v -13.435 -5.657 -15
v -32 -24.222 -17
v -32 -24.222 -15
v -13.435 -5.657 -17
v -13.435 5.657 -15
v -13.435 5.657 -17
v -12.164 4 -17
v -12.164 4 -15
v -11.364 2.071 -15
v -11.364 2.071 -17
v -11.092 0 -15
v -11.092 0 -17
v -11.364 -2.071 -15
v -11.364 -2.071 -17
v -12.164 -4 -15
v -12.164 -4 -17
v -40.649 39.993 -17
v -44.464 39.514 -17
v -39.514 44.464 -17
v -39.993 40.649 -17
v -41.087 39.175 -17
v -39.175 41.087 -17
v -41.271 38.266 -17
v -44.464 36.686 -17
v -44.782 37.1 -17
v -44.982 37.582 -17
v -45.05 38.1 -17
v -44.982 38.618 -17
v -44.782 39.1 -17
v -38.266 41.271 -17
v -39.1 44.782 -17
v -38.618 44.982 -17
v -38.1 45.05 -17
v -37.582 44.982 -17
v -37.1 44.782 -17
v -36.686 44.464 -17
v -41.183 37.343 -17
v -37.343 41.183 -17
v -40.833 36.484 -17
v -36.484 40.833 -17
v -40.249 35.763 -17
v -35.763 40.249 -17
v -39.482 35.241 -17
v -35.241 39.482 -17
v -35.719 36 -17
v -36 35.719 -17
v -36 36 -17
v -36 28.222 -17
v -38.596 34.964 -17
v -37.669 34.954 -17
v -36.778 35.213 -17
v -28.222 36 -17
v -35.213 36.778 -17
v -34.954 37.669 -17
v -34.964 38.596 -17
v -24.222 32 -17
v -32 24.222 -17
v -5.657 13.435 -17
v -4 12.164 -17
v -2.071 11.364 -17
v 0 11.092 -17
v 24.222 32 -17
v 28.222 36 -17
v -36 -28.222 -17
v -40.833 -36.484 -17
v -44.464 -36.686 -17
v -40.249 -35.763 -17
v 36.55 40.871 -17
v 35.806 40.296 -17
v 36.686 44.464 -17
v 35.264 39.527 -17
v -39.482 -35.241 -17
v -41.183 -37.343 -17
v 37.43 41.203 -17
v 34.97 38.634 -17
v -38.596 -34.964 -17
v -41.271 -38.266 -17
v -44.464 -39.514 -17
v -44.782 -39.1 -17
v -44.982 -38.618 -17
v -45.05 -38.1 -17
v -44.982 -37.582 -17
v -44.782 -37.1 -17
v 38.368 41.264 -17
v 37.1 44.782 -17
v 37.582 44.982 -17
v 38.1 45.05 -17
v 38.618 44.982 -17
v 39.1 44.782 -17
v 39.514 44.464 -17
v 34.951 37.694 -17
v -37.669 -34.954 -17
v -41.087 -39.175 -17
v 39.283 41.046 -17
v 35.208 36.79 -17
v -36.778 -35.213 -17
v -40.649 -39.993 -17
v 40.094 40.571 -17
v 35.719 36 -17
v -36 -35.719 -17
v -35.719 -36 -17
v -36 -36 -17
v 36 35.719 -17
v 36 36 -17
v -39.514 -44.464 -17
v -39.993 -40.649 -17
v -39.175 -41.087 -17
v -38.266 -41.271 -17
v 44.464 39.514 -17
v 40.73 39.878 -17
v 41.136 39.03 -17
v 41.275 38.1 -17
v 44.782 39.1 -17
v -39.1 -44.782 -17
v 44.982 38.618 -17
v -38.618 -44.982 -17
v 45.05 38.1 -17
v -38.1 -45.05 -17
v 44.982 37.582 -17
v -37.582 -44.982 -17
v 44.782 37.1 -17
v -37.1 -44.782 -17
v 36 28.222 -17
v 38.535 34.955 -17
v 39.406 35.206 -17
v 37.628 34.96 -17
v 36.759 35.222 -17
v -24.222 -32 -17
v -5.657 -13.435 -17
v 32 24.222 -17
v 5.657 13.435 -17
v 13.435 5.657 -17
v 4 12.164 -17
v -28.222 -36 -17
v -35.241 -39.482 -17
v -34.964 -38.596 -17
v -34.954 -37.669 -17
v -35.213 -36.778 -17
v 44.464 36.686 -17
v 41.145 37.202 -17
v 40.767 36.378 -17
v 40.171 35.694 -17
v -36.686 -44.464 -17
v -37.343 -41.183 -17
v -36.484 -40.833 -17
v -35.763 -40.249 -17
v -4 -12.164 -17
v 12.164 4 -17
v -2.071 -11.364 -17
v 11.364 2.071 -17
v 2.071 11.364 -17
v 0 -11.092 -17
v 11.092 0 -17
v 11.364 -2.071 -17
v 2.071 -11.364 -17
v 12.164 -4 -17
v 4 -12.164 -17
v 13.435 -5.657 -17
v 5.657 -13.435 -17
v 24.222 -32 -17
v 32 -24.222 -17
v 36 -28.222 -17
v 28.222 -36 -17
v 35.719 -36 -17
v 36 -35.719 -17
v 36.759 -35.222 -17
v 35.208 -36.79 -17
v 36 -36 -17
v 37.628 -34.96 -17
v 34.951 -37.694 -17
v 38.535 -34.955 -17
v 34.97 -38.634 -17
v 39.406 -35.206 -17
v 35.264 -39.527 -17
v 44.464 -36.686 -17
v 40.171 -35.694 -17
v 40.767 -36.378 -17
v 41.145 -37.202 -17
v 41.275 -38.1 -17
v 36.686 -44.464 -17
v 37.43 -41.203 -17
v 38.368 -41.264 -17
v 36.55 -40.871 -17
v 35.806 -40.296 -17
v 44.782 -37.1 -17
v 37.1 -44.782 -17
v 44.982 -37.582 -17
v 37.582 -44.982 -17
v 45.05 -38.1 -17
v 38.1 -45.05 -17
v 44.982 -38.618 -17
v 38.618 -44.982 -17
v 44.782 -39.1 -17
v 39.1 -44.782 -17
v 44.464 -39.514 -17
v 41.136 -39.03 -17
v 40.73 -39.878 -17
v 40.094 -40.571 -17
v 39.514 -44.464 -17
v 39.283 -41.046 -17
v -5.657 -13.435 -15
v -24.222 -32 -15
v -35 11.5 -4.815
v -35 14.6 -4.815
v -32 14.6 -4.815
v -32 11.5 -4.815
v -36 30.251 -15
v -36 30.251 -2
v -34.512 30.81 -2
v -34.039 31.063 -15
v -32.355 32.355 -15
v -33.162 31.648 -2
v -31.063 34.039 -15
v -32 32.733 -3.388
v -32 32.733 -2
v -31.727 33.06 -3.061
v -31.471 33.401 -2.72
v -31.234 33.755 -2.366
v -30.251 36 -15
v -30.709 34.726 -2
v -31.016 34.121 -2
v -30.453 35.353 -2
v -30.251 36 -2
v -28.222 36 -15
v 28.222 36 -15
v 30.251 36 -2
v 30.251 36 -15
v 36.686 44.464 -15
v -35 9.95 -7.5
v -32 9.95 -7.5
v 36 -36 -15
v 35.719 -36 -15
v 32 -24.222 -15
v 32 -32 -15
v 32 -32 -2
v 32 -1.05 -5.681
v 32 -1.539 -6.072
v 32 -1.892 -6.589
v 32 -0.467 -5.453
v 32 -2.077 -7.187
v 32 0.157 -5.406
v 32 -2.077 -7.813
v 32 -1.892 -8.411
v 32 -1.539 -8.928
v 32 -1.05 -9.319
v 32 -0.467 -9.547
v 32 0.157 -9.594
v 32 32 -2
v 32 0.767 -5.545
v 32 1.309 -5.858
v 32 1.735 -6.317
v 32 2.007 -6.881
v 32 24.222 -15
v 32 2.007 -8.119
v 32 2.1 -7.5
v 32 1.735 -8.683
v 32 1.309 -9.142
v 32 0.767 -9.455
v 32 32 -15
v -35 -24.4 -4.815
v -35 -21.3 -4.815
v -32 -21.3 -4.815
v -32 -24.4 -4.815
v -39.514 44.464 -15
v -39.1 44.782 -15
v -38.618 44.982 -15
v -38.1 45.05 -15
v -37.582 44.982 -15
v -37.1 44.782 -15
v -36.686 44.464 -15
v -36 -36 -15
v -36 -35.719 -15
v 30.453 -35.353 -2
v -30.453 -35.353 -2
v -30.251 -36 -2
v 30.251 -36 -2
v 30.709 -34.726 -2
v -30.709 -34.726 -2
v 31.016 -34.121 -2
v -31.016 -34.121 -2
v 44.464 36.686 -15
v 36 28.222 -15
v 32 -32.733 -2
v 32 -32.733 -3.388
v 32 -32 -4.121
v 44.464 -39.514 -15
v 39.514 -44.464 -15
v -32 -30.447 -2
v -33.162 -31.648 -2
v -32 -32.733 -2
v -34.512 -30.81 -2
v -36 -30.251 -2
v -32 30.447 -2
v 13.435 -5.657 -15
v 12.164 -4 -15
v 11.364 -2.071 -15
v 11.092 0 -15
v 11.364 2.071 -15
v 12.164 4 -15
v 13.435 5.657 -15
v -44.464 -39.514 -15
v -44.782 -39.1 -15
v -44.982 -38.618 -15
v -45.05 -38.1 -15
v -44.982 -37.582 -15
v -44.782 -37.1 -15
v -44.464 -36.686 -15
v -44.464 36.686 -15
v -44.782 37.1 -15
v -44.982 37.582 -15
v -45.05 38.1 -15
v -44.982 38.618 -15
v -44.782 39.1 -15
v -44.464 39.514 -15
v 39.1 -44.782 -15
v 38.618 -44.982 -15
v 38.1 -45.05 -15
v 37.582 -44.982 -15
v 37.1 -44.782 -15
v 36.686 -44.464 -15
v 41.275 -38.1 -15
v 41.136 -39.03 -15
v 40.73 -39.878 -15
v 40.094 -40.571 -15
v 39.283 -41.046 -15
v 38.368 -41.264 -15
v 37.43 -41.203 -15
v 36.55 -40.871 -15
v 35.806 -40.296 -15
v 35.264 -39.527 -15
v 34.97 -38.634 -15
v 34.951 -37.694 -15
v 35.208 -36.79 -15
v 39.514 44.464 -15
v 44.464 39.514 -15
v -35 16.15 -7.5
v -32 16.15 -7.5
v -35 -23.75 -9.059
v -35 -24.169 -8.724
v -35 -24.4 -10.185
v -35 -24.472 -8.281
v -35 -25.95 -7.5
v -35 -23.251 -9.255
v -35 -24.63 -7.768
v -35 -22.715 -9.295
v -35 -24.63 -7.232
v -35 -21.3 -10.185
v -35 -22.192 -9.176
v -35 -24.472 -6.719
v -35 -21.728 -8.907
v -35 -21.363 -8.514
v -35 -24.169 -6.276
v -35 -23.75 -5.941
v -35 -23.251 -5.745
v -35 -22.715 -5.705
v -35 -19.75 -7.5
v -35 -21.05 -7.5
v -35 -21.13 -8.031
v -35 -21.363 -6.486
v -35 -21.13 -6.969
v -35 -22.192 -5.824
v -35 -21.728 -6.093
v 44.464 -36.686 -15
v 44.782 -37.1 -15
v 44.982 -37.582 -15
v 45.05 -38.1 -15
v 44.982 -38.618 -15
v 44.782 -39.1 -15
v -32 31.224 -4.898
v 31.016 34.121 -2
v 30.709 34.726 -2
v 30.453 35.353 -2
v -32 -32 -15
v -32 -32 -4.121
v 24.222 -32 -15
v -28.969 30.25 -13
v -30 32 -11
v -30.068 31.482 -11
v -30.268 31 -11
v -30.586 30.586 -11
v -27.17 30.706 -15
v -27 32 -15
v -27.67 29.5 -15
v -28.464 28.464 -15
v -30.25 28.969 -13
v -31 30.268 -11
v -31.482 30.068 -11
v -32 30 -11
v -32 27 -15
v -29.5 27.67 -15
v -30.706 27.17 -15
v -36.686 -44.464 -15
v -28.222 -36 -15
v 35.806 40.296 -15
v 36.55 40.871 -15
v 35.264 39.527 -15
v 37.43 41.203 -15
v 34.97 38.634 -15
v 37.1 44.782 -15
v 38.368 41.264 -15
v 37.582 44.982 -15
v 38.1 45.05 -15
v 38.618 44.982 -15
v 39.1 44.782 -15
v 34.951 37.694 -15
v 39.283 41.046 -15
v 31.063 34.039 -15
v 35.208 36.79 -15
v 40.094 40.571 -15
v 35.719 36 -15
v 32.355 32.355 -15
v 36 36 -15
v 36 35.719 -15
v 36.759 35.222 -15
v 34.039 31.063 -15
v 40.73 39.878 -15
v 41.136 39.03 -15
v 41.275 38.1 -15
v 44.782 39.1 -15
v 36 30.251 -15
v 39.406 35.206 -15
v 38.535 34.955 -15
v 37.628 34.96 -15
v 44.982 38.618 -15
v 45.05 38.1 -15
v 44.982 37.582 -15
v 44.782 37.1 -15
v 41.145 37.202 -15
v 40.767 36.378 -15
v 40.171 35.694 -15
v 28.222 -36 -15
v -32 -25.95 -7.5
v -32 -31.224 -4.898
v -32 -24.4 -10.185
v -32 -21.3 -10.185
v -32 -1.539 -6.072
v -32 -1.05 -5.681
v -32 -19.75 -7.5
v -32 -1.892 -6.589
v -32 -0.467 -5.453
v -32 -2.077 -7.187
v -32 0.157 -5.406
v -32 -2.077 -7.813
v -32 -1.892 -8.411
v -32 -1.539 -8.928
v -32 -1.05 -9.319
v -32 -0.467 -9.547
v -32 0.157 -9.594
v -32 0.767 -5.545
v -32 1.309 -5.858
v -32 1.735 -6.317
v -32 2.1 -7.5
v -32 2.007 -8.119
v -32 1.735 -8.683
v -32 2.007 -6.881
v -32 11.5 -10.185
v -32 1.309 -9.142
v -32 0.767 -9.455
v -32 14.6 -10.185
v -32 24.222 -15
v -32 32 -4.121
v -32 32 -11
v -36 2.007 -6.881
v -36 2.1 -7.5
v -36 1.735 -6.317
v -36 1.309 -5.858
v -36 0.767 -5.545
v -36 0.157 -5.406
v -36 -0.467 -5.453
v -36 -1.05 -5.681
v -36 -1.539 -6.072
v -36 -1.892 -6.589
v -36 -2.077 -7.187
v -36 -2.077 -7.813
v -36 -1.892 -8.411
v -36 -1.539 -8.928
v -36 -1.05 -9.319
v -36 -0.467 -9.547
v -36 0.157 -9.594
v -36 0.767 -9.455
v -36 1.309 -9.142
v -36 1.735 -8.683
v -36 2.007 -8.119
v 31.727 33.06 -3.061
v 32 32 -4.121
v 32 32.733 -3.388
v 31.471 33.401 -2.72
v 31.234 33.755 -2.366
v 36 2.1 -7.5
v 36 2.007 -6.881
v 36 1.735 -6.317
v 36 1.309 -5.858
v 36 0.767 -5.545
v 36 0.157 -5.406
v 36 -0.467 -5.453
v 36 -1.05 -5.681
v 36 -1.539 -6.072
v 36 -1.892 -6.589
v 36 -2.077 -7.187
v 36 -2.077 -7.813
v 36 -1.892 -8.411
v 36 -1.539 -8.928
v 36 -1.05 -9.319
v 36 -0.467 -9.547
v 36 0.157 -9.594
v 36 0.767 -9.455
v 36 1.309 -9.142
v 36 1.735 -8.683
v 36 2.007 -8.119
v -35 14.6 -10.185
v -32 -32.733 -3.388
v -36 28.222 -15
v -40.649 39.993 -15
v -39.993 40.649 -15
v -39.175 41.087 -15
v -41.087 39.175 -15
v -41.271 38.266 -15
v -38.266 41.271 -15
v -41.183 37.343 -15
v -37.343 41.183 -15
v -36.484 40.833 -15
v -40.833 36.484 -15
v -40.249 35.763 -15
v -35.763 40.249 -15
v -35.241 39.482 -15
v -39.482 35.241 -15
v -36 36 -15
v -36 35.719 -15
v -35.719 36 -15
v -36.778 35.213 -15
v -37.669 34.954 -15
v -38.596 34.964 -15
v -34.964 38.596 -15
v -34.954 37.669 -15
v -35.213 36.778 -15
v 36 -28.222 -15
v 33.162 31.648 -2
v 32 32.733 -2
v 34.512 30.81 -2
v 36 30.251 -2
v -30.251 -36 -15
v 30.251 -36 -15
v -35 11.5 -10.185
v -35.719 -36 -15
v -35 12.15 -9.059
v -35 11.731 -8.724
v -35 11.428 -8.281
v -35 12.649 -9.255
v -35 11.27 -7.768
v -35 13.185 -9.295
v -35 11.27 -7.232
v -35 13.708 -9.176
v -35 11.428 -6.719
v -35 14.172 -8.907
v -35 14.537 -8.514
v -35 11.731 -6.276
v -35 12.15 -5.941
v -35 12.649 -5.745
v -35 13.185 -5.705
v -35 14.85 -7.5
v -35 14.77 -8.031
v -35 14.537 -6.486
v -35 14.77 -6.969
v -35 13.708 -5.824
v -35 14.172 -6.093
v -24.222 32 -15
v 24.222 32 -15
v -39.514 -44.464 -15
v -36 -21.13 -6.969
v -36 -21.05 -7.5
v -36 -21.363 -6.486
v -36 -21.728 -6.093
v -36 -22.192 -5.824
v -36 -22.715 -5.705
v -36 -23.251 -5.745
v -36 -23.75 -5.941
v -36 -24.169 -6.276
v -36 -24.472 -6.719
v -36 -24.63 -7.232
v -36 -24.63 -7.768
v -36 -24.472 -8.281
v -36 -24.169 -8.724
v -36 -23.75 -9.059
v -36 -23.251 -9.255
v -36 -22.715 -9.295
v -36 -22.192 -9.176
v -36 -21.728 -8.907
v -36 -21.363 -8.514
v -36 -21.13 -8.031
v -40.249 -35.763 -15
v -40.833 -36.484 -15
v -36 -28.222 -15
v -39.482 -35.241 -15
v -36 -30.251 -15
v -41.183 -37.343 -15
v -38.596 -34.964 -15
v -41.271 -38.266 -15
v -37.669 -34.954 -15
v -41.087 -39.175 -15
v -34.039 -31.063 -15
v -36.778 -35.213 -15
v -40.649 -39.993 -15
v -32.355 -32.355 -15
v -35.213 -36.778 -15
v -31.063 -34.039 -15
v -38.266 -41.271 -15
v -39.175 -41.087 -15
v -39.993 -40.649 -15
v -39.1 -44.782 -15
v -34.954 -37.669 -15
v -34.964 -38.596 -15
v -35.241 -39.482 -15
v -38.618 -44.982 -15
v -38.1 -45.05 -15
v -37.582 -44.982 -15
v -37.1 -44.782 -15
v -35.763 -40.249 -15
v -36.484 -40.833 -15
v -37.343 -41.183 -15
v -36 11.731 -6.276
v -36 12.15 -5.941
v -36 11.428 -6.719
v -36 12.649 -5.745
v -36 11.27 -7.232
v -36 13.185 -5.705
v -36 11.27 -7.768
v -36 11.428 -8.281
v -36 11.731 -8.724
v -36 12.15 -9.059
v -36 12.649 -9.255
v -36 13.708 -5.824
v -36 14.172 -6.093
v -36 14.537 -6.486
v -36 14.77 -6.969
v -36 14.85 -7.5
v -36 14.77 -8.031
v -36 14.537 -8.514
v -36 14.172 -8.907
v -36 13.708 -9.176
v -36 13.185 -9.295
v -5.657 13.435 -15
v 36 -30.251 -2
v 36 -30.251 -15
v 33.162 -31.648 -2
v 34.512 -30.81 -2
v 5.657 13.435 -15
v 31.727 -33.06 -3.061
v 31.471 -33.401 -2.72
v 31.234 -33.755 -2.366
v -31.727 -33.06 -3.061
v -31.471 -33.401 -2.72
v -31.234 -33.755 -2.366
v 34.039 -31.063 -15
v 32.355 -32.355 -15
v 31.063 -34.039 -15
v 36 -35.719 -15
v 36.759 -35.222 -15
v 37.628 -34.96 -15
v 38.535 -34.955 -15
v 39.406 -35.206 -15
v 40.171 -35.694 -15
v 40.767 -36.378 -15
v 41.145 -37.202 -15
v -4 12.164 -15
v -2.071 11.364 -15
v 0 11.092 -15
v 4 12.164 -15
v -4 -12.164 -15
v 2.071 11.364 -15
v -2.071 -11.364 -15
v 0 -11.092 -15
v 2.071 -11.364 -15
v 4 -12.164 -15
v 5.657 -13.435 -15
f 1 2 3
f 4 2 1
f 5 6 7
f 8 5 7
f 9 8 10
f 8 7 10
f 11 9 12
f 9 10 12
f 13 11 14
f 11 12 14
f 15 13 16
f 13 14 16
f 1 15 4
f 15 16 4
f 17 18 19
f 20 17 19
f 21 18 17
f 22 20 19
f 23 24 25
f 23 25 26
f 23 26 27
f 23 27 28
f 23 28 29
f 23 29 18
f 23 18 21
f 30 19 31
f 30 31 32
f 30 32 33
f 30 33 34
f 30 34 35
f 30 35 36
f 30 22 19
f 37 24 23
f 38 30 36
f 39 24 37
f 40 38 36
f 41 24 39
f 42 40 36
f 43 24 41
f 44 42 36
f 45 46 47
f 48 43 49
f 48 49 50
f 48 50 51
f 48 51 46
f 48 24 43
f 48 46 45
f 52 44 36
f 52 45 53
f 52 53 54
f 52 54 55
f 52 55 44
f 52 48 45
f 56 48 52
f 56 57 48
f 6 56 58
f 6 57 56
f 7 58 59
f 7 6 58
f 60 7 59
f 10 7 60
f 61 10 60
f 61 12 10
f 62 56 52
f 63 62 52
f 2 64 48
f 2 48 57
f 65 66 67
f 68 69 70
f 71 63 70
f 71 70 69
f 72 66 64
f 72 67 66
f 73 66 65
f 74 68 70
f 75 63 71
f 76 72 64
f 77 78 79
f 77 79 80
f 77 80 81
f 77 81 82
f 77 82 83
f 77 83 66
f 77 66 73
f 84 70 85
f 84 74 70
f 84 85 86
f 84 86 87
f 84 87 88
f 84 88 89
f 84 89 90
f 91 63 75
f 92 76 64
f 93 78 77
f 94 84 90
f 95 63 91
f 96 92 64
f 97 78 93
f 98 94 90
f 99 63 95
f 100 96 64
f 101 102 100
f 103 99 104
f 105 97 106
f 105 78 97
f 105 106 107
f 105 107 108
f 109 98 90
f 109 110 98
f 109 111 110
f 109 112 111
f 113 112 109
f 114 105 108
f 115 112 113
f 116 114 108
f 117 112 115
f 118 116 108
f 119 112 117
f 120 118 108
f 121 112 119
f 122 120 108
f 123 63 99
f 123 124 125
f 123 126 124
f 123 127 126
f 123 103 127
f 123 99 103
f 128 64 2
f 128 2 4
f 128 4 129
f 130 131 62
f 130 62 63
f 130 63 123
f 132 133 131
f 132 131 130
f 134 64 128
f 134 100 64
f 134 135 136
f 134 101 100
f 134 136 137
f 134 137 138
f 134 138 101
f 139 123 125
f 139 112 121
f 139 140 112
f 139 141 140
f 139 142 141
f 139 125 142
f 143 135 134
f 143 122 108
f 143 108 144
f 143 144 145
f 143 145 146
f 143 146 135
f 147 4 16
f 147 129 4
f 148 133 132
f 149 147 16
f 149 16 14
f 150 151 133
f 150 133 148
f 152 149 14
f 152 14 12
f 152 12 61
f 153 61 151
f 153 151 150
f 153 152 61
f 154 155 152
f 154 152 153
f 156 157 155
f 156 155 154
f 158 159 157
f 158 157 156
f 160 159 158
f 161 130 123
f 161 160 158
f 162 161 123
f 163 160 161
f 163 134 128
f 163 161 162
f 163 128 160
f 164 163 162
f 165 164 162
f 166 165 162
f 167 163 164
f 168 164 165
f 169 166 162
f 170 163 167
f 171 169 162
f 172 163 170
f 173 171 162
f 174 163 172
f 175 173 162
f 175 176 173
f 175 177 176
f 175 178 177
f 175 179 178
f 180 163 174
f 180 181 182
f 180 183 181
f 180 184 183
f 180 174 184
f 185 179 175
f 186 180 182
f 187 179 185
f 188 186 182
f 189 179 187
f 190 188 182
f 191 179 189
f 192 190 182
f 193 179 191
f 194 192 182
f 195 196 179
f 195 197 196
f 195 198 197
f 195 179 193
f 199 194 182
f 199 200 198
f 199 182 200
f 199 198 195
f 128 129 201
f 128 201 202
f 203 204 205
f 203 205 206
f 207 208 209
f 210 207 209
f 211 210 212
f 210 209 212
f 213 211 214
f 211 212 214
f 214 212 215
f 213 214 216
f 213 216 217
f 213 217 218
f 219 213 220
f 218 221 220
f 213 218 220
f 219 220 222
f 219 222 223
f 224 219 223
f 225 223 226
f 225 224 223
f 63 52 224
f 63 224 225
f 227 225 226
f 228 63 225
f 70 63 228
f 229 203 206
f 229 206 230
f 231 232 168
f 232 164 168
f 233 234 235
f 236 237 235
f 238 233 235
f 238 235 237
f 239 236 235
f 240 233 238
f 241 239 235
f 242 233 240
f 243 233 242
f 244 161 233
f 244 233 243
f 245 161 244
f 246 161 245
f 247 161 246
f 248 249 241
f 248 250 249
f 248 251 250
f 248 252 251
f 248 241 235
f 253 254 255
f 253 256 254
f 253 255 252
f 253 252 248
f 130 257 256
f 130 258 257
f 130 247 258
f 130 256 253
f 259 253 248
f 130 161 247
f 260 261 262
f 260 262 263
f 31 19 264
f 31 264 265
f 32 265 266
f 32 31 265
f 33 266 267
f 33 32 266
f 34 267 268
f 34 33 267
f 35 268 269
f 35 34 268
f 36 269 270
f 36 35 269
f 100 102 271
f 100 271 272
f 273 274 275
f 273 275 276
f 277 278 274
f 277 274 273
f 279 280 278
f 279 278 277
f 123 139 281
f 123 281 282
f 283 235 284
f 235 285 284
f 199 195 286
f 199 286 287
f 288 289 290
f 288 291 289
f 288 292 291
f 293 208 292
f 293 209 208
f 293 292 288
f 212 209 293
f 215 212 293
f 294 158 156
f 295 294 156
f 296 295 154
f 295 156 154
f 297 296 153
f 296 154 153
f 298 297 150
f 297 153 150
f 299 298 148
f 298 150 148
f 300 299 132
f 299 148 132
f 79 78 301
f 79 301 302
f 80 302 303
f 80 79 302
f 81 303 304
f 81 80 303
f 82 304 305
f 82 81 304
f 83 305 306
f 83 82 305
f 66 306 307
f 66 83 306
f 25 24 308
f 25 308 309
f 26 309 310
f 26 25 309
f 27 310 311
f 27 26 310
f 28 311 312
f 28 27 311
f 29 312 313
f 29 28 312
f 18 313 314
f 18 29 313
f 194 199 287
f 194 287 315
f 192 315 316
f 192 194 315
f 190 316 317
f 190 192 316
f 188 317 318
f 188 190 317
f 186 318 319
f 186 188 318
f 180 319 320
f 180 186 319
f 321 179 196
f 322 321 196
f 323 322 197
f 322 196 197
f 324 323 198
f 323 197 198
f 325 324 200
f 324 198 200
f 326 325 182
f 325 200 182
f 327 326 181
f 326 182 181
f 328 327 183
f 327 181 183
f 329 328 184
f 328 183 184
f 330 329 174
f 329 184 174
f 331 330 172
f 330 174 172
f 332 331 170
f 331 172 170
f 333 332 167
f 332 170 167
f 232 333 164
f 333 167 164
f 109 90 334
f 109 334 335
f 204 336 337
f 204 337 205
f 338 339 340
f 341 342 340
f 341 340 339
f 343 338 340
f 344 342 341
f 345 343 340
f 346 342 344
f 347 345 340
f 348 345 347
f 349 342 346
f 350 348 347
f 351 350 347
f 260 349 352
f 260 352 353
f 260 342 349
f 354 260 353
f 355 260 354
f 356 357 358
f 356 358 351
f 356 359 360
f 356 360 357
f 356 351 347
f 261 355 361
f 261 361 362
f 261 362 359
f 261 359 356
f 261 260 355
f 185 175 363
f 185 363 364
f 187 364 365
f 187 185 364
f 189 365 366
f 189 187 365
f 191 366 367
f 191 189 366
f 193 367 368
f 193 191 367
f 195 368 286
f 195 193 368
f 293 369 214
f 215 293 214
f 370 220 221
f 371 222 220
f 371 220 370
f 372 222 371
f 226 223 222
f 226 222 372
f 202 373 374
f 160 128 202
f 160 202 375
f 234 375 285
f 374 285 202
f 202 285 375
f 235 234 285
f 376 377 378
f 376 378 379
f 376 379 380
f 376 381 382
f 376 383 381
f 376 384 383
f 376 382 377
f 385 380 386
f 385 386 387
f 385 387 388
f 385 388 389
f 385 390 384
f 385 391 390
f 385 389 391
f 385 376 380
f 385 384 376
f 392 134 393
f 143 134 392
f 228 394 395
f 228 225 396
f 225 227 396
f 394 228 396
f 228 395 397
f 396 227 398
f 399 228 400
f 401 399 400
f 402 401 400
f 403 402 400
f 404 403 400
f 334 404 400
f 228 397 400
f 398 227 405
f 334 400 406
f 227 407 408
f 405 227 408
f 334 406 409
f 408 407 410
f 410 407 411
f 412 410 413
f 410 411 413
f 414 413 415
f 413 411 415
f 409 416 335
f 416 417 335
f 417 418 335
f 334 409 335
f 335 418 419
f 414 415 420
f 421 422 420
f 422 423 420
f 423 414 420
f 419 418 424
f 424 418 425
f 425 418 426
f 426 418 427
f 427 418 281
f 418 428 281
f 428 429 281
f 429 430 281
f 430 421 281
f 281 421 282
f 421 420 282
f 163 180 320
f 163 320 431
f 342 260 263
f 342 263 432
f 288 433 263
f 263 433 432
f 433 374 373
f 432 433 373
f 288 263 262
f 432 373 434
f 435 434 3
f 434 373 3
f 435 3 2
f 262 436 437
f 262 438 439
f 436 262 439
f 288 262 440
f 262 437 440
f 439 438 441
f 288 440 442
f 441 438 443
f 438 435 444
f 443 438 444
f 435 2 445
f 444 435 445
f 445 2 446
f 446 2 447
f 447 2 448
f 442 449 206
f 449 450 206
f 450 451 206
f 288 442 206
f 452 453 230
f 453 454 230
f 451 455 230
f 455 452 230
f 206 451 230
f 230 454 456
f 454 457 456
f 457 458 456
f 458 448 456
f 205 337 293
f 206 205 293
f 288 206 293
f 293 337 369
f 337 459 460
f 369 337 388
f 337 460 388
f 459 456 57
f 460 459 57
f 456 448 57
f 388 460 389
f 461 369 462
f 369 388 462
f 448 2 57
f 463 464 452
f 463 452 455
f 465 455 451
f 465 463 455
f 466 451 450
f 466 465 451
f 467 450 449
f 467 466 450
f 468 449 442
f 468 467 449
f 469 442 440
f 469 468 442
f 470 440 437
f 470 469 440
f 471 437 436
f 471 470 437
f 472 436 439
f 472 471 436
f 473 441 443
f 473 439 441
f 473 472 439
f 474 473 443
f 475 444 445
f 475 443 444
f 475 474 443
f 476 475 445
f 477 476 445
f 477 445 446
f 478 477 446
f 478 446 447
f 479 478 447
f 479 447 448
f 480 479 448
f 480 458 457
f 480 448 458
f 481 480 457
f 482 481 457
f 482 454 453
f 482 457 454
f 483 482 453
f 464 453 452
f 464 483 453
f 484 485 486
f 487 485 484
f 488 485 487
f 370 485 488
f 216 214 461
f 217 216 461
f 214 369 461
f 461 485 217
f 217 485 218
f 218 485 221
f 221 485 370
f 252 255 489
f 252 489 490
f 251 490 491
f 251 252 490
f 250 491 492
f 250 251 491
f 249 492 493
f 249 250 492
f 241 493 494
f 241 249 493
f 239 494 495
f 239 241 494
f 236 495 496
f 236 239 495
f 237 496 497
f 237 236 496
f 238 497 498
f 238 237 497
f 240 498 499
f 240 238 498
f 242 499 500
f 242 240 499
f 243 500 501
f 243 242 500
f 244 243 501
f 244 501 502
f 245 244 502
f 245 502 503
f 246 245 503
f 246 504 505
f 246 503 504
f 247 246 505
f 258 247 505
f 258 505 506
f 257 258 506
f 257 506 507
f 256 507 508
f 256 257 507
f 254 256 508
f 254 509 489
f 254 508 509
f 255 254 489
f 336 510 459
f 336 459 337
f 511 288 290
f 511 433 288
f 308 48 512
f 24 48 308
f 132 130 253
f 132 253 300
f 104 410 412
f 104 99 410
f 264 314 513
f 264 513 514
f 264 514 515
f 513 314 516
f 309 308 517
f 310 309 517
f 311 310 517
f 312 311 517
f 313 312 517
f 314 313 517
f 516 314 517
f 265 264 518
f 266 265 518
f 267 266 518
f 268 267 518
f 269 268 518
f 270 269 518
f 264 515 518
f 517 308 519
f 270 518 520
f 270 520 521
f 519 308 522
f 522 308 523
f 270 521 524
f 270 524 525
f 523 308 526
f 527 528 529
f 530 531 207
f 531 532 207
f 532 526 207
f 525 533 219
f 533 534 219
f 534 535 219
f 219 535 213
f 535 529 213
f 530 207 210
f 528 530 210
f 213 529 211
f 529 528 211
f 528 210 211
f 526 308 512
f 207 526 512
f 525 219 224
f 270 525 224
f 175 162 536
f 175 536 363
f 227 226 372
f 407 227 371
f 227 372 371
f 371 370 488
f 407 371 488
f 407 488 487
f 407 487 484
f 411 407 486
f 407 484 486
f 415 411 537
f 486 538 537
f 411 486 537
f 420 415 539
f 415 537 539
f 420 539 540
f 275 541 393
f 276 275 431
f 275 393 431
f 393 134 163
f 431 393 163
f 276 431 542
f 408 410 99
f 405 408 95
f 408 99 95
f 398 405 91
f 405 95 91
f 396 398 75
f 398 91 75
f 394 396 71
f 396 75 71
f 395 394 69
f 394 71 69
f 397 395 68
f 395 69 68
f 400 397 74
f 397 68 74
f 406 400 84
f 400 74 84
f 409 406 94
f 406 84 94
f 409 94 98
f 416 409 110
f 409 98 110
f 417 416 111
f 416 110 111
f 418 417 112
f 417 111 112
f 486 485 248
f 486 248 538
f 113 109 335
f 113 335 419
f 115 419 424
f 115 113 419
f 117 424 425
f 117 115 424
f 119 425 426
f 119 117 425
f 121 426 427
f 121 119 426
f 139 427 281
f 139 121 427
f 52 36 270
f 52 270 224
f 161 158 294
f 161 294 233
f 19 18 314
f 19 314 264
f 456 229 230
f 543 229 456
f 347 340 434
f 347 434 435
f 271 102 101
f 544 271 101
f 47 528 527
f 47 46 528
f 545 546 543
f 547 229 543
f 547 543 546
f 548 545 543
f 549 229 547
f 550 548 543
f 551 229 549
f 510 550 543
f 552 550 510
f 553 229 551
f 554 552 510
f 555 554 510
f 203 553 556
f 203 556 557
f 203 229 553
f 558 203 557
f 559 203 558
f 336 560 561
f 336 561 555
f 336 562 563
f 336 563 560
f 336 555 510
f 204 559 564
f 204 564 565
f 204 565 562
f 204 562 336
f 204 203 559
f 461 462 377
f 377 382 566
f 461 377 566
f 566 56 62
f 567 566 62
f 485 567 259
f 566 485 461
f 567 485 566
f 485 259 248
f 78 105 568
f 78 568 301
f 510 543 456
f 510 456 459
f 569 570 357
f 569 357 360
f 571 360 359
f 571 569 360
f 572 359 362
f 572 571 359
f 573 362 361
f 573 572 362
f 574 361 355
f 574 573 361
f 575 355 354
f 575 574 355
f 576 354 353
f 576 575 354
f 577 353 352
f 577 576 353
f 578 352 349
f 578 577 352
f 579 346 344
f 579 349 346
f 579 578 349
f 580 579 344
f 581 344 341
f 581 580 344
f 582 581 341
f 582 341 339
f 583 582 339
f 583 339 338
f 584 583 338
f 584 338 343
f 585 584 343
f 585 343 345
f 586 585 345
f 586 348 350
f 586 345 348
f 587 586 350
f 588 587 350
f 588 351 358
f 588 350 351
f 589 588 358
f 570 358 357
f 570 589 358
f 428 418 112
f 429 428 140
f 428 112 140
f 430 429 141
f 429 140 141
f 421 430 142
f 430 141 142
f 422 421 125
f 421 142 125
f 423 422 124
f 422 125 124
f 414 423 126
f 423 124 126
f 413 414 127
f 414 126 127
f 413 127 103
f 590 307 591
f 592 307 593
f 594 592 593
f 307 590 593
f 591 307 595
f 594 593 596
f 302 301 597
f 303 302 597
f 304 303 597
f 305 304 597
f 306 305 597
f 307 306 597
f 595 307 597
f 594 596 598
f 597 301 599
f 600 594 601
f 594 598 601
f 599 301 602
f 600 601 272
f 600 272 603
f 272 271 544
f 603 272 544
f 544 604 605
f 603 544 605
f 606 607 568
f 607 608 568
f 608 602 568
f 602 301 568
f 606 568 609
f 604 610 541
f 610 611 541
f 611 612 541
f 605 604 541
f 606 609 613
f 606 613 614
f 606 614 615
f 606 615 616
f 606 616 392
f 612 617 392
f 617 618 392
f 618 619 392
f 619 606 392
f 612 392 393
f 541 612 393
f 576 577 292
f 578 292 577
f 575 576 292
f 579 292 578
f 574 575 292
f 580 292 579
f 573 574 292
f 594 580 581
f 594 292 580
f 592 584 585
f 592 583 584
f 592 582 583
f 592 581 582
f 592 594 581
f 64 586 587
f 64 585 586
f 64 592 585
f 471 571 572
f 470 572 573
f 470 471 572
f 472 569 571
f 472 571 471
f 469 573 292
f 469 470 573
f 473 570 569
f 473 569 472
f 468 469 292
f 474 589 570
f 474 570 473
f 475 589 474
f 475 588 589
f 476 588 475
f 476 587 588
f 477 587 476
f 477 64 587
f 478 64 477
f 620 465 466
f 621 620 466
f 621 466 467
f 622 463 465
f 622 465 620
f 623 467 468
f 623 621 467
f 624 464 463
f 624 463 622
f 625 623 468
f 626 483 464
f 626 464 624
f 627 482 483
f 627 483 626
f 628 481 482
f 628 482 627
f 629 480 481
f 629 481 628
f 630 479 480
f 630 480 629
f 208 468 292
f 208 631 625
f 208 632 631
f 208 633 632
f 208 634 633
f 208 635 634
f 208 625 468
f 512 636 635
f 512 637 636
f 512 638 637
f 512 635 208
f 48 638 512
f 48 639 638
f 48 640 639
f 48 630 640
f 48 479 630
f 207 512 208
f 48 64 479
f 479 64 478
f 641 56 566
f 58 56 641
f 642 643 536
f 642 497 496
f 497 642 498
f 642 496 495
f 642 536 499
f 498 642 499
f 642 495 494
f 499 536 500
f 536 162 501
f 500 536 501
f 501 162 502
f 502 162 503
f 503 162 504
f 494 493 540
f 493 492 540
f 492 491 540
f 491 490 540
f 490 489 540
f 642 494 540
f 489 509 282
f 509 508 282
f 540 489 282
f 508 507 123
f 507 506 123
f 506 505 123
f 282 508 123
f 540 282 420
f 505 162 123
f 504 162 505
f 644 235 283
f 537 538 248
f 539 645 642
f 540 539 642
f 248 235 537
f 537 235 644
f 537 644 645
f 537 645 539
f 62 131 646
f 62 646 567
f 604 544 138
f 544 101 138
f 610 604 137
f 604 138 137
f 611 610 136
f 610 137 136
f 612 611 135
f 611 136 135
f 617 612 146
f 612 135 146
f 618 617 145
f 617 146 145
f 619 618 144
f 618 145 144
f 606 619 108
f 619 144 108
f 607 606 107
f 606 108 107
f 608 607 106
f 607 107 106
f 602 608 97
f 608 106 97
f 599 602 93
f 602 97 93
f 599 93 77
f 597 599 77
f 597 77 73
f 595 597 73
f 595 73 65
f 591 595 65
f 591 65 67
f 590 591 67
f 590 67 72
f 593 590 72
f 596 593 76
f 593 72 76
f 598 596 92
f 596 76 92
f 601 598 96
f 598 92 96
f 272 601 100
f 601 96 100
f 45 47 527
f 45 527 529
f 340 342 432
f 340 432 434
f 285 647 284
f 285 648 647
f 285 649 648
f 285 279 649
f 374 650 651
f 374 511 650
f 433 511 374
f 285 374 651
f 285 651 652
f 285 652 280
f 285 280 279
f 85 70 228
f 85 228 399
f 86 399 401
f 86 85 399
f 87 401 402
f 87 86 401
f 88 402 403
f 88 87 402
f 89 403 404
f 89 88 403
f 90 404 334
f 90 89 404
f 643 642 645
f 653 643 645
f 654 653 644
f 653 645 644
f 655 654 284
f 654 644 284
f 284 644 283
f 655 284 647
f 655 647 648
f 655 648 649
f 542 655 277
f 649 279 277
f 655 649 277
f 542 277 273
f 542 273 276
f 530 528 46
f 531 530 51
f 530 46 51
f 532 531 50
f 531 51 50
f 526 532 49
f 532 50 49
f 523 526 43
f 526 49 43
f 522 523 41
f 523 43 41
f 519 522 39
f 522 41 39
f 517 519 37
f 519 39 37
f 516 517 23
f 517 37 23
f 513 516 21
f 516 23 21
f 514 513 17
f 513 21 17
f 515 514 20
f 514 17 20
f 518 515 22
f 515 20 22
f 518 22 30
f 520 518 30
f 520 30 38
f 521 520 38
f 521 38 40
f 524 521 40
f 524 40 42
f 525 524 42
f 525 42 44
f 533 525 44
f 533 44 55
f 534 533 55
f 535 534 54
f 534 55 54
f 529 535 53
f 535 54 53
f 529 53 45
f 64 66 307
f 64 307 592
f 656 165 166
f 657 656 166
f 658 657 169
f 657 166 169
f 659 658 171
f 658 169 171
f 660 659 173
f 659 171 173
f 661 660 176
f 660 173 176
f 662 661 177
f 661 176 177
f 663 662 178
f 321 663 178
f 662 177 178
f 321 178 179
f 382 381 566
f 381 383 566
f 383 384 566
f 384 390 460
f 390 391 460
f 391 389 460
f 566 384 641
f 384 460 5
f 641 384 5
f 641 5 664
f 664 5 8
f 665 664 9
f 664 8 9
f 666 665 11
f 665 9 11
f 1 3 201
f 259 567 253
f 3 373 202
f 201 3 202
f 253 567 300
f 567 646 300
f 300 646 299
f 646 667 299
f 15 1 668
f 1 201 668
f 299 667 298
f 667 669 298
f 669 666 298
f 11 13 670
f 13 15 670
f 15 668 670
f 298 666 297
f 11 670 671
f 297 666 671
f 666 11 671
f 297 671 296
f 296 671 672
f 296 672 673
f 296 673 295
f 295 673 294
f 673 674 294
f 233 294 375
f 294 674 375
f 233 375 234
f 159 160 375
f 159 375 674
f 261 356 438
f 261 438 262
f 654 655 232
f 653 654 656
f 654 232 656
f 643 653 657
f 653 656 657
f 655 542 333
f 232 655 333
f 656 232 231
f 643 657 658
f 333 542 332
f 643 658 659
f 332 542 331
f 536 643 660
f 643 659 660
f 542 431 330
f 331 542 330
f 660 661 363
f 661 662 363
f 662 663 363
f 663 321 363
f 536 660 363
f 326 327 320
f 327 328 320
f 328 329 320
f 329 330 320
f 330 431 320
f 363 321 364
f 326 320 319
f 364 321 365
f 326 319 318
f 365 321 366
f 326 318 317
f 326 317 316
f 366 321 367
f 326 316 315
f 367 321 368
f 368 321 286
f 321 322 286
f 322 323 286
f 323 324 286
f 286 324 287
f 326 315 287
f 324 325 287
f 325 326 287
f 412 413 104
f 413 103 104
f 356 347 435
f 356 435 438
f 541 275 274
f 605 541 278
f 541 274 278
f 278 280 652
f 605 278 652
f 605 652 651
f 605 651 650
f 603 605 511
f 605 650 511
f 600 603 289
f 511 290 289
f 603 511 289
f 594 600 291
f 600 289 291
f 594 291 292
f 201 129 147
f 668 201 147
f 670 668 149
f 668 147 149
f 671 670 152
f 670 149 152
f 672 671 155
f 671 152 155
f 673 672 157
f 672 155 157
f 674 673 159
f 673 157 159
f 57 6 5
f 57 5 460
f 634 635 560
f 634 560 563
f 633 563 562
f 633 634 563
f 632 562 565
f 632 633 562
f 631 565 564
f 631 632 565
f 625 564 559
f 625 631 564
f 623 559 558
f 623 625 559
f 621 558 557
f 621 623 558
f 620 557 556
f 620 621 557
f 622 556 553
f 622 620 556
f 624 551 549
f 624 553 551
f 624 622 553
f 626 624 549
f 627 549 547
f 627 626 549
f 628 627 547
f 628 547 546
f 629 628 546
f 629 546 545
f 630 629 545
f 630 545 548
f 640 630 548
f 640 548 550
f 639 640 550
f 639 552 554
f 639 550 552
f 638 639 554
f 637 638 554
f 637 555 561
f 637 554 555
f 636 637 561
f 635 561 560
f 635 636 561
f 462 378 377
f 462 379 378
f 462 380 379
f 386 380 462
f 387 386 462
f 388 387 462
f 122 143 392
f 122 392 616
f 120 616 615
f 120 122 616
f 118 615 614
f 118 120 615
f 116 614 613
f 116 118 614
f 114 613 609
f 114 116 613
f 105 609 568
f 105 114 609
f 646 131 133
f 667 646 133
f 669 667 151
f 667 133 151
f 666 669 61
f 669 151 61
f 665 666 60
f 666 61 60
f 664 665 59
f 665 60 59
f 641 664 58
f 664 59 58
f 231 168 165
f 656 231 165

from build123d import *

# Parameters (mm, degrees)
CYLINDER_R               = 2.1
CYLINDER_DEPTH           = 73
PRISM_DEPTH              = 64
PRISM_ROLL_ANGLE         = 90
PRISM_PITCH_ANGLE        = -14.999988
PRISM_PLACEMENT_ANGLE    = 90
PRISM001_DEPTH           = 64
PRISM001_ROLL_ANGLE      = -90
PRISM001_PITCH_ANGLE     = -14.999988
PRISM001_PLACEMENT_ANGLE = -90
PRISM002_DEPTH           = 3
PRISM003_DEPTH           = 3
CYLINDER001_R            = 1.8
CYLINDER001_DEPTH        = 6
CYLINDER002_R            = 1.8
CYLINDER002_DEPTH        = 6
CUBE001_W                = 64
CUBE001_H                = 64
CUBE001_DEPTH            = 15
CUBE_W                   = 72
CUBE_H                   = 72
CUBE_DEPTH               = 15
SKETCH001_R              = 3.175
PAD_DEPTH                = 2
SKETCH_R                 = 8.125
POCKET_DEPTH             = 13
REVOLUTION_ANGLE         = -90


with BuildPart() as cylinder:
    # cylinder → cylinder (new body)
    with BuildSketch(Plane(origin=(-36.5, 0, -7.5), x_dir=(0, 1, 0), z_dir=(1, 0, 0))):
        Circle(CYLINDER_R)
    extrude(amount=CYLINDER_DEPTH)


with BuildPart() as prism:
    # prism → prism (new body)
    with BuildSketch(Plane.XY):
        Polygon((3, 0), (-1.5, 2.598076), (-1.5, -2.598076), align=None)
    extrude(amount=PRISM_DEPTH)


with BuildPart() as prism_1:
    # prism roll: moved
    add(prism.part.rotate(Axis((0, 0, 0), (1, 0, 0)), PRISM_ROLL_ANGLE))


with BuildPart() as prism_2:
    # prism pitch: moved
    add(prism_1.part.rotate(Axis((0, 0, 0), (0, 1, 0)), PRISM_PITCH_ANGLE))


with BuildPart() as prism_3:
    # prism placement: moved
    add(prism_2.part.moved(Location((-32.000004, 32, -2))).rotate(Axis((-32.000004, 32, -2), (0, 0, 1)), PRISM_PLACEMENT_ANGLE))


with BuildPart() as prism001:
    # prism001 → prism001 (new body)
    with BuildSketch(Plane.XY):
        Polygon((3, 0), (-1.5, 2.598076), (-1.5, -2.598076), align=None)
    extrude(amount=PRISM001_DEPTH)


with BuildPart() as prism001_1:
    # prism001 roll: moved
    add(prism001.part.rotate(Axis((0, 0, 0), (1, 0, 0)), PRISM001_ROLL_ANGLE))


with BuildPart() as prism001_2:
    # prism001 pitch: moved
    add(prism001_1.part.rotate(Axis((0, 0, 0), (0, 1, 0)), PRISM001_PITCH_ANGLE))


with BuildPart() as prism001_3:
    # prism001 placement: moved
    add(prism001_2.part.moved(Location((-32.000004, -32, -2))).rotate(Axis((-32.000004, -32, -2), (0, 0, 1)), PRISM001_PLACEMENT_ANGLE))


with BuildPart() as prism002:
    # prism002 → prism002 (new body)
    with BuildSketch(Plane(origin=(-35, 13.05, -7.5), x_dir=(0, 1, 0), z_dir=(1, 0, 0))):
        Polygon((3.1, 0), (1.55, 2.684679), (-1.55, 2.684679), (-3.1, 0), (-1.55, -2.684679), (1.55, -2.684679), align=None)
    extrude(amount=PRISM002_DEPTH)


with BuildPart() as prism003:
    # prism003 → prism003 (new body)
    with BuildSketch(Plane(origin=(-35, -22.85, -7.5), x_dir=(0, 1, 0), z_dir=(1, 0, 0))):
        Polygon((3.1, 0), (1.55, 2.684679), (-1.55, 2.684679), (-3.1, 0), (-1.55, -2.684679), (1.55, -2.684679), align=None)
    extrude(amount=PRISM003_DEPTH)


with BuildPart() as cylinder001:
    # cylinder001 → cylinder001 (new body)
    with BuildSketch(Plane(origin=(-36.5, 13.05, -7.5), x_dir=(0, 1, 0), z_dir=(1, 0, 0))):
        Circle(CYLINDER001_R)
    extrude(amount=CYLINDER001_DEPTH)


with BuildPart() as cylinder002:
    # cylinder002 → cylinder002 (new body)
    with BuildSketch(Plane(origin=(-36.5, -22.85, -7.5), x_dir=(0, 1, 0), z_dir=(1, 0, 0))):
        Circle(CYLINDER002_R)
    extrude(amount=CYLINDER002_DEPTH)


with BuildPart() as group:
    # cube001 → cube001 (new body)
    with BuildSketch(Plane(origin=(-32, -32, -17), x_dir=(1, 0, 0), z_dir=(0, 0, 1))):
        with Locations((32, 32)):
            Rectangle(CUBE001_W, CUBE001_H)
    extrude(amount=CUBE001_DEPTH)

    # Group: union cylinder, prism, prism001, prism002, prism003, cylinder001, cylinder002
    add(cylinder.part)
    add(prism_3.part)
    add(prism001_3.part)
    add(prism002.part)
    add(prism003.part)
    add(cylinder001.part)
    add(cylinder002.part)


with BuildPart() as base_square:
    # cube → cube (new body)
    with BuildSketch(Plane(origin=(-36, -36, -17), x_dir=(1, 0, 0), z_dir=(0, 0, 1))):
        with Locations((36, 36)):
            Rectangle(CUBE_W, CUBE_H)
    extrude(amount=CUBE_DEPTH)

    # difference: cut Group
    add(group.part, mode=Mode.SUBTRACT)

    # Sketch001 → Pad (new body)
    with BuildSketch(Plane(origin=(0, 0, -17), x_dir=(1, 0, 0), z_dir=(0, 0, -1))):
        with BuildLine():
            Line((-44.463961, 36.685786), (-13.435029, 5.656854))
            ThreePointArc((-13.435029, -5.656854), (-11.091883, 0), (-13.435029, 5.656854))
            Line((-13.435029, -5.656854), (-44.463961, -36.685786))
            ThreePointArc((-44.463961, -36.685786), (-45.049747, -38.1), (-44.463961, -39.514214))
            Line((-44.463961, -39.514214), (-39.514214, -44.463961))
            ThreePointArc((-39.514214, -44.463961), (-38.1, -45.049747), (-36.685786, -44.463961))
            Line((-36.685786, -44.463961), (-5.656854, -13.435029))
            ThreePointArc((5.656854, -13.435029), (0, -11.091883), (-5.656854, -13.435029))
            Line((5.656854, -13.435029), (36.685786, -44.463961))
            ThreePointArc((36.685786, -44.463961), (38.1, -45.049747), (39.514214, -44.463961))
            Line((39.514214, -44.463961), (44.463961, -39.514214))
            ThreePointArc((44.463961, -39.514214), (45.049747, -38.1), (44.463961, -36.685786))
            Line((44.463961, -36.685786), (13.435029, -5.656854))
            ThreePointArc((13.435029, 5.656854), (11.091883, 0), (13.435029, -5.656854))
            Line((13.435029, 5.656854), (44.463961, 36.685786))
            ThreePointArc((44.463961, 36.685786), (45.049747, 38.1), (44.463961, 39.514214))
            Line((44.463961, 39.514214), (39.514214, 44.463961))
            ThreePointArc((39.514214, 44.463961), (38.1, 45.049747), (36.685786, 44.463961))
            Line((36.685786, 44.463961), (5.656854, 13.435029))
            ThreePointArc((-5.656854, 13.435029), (0, 11.091883), (5.656854, 13.435029))
            Line((-5.656854, 13.435029), (-36.685786, 44.463961))
            ThreePointArc((-36.685786, 44.463961), (-38.1, 45.049747), (-39.514214, 44.463961))
            Line((-39.514214, 44.463961), (-44.463961, 39.514214))
            ThreePointArc((-44.463961, 39.514214), (-45.049747, 38.1), (-44.463961, 36.685786))
        make_face()
        with Locations((-38.1, 38.1)):
            Circle(SKETCH001_R, mode=Mode.SUBTRACT)
        with Locations((38.1, 38.1)):
            Circle(SKETCH001_R, mode=Mode.SUBTRACT)
        with Locations((-38.1, -38.1)):
            Circle(SKETCH001_R, mode=Mode.SUBTRACT)
        with Locations((38.1, -38.1)):
            Circle(SKETCH001_R, mode=Mode.SUBTRACT)
    extrude(amount=-PAD_DEPTH)

    # Sketch (on Face21 of Pad) → Pocket (cut)
    with BuildSketch(Plane.XY.offset(-2)):
        with Locations((-38.1, -38.1)):
            Circle(SKETCH_R)
        with Locations((38.1, -38.1)):
            Circle(SKETCH_R)
        with Locations((38.1, 38.1)):
            Circle(SKETCH_R)
        with Locations((-38.1, 38.1)):
            Circle(SKETCH_R)
    extrude(amount=-POCKET_DEPTH, mode=Mode.SUBTRACT)

    # Sketch002 (on Face26 of Pocket) → Revolution (revolve)
    with BuildSketch(Plane.XZ.offset(-32)):
        Polygon((-32, -15), (-32, -11), (-30, -11), (-27, -15), align=None)
    revolve(axis=Axis((-32, 32, -9.56066), (0, 0, 1)), revolution_arc=REVOLUTION_ANGLE)


solid = base_square.part
